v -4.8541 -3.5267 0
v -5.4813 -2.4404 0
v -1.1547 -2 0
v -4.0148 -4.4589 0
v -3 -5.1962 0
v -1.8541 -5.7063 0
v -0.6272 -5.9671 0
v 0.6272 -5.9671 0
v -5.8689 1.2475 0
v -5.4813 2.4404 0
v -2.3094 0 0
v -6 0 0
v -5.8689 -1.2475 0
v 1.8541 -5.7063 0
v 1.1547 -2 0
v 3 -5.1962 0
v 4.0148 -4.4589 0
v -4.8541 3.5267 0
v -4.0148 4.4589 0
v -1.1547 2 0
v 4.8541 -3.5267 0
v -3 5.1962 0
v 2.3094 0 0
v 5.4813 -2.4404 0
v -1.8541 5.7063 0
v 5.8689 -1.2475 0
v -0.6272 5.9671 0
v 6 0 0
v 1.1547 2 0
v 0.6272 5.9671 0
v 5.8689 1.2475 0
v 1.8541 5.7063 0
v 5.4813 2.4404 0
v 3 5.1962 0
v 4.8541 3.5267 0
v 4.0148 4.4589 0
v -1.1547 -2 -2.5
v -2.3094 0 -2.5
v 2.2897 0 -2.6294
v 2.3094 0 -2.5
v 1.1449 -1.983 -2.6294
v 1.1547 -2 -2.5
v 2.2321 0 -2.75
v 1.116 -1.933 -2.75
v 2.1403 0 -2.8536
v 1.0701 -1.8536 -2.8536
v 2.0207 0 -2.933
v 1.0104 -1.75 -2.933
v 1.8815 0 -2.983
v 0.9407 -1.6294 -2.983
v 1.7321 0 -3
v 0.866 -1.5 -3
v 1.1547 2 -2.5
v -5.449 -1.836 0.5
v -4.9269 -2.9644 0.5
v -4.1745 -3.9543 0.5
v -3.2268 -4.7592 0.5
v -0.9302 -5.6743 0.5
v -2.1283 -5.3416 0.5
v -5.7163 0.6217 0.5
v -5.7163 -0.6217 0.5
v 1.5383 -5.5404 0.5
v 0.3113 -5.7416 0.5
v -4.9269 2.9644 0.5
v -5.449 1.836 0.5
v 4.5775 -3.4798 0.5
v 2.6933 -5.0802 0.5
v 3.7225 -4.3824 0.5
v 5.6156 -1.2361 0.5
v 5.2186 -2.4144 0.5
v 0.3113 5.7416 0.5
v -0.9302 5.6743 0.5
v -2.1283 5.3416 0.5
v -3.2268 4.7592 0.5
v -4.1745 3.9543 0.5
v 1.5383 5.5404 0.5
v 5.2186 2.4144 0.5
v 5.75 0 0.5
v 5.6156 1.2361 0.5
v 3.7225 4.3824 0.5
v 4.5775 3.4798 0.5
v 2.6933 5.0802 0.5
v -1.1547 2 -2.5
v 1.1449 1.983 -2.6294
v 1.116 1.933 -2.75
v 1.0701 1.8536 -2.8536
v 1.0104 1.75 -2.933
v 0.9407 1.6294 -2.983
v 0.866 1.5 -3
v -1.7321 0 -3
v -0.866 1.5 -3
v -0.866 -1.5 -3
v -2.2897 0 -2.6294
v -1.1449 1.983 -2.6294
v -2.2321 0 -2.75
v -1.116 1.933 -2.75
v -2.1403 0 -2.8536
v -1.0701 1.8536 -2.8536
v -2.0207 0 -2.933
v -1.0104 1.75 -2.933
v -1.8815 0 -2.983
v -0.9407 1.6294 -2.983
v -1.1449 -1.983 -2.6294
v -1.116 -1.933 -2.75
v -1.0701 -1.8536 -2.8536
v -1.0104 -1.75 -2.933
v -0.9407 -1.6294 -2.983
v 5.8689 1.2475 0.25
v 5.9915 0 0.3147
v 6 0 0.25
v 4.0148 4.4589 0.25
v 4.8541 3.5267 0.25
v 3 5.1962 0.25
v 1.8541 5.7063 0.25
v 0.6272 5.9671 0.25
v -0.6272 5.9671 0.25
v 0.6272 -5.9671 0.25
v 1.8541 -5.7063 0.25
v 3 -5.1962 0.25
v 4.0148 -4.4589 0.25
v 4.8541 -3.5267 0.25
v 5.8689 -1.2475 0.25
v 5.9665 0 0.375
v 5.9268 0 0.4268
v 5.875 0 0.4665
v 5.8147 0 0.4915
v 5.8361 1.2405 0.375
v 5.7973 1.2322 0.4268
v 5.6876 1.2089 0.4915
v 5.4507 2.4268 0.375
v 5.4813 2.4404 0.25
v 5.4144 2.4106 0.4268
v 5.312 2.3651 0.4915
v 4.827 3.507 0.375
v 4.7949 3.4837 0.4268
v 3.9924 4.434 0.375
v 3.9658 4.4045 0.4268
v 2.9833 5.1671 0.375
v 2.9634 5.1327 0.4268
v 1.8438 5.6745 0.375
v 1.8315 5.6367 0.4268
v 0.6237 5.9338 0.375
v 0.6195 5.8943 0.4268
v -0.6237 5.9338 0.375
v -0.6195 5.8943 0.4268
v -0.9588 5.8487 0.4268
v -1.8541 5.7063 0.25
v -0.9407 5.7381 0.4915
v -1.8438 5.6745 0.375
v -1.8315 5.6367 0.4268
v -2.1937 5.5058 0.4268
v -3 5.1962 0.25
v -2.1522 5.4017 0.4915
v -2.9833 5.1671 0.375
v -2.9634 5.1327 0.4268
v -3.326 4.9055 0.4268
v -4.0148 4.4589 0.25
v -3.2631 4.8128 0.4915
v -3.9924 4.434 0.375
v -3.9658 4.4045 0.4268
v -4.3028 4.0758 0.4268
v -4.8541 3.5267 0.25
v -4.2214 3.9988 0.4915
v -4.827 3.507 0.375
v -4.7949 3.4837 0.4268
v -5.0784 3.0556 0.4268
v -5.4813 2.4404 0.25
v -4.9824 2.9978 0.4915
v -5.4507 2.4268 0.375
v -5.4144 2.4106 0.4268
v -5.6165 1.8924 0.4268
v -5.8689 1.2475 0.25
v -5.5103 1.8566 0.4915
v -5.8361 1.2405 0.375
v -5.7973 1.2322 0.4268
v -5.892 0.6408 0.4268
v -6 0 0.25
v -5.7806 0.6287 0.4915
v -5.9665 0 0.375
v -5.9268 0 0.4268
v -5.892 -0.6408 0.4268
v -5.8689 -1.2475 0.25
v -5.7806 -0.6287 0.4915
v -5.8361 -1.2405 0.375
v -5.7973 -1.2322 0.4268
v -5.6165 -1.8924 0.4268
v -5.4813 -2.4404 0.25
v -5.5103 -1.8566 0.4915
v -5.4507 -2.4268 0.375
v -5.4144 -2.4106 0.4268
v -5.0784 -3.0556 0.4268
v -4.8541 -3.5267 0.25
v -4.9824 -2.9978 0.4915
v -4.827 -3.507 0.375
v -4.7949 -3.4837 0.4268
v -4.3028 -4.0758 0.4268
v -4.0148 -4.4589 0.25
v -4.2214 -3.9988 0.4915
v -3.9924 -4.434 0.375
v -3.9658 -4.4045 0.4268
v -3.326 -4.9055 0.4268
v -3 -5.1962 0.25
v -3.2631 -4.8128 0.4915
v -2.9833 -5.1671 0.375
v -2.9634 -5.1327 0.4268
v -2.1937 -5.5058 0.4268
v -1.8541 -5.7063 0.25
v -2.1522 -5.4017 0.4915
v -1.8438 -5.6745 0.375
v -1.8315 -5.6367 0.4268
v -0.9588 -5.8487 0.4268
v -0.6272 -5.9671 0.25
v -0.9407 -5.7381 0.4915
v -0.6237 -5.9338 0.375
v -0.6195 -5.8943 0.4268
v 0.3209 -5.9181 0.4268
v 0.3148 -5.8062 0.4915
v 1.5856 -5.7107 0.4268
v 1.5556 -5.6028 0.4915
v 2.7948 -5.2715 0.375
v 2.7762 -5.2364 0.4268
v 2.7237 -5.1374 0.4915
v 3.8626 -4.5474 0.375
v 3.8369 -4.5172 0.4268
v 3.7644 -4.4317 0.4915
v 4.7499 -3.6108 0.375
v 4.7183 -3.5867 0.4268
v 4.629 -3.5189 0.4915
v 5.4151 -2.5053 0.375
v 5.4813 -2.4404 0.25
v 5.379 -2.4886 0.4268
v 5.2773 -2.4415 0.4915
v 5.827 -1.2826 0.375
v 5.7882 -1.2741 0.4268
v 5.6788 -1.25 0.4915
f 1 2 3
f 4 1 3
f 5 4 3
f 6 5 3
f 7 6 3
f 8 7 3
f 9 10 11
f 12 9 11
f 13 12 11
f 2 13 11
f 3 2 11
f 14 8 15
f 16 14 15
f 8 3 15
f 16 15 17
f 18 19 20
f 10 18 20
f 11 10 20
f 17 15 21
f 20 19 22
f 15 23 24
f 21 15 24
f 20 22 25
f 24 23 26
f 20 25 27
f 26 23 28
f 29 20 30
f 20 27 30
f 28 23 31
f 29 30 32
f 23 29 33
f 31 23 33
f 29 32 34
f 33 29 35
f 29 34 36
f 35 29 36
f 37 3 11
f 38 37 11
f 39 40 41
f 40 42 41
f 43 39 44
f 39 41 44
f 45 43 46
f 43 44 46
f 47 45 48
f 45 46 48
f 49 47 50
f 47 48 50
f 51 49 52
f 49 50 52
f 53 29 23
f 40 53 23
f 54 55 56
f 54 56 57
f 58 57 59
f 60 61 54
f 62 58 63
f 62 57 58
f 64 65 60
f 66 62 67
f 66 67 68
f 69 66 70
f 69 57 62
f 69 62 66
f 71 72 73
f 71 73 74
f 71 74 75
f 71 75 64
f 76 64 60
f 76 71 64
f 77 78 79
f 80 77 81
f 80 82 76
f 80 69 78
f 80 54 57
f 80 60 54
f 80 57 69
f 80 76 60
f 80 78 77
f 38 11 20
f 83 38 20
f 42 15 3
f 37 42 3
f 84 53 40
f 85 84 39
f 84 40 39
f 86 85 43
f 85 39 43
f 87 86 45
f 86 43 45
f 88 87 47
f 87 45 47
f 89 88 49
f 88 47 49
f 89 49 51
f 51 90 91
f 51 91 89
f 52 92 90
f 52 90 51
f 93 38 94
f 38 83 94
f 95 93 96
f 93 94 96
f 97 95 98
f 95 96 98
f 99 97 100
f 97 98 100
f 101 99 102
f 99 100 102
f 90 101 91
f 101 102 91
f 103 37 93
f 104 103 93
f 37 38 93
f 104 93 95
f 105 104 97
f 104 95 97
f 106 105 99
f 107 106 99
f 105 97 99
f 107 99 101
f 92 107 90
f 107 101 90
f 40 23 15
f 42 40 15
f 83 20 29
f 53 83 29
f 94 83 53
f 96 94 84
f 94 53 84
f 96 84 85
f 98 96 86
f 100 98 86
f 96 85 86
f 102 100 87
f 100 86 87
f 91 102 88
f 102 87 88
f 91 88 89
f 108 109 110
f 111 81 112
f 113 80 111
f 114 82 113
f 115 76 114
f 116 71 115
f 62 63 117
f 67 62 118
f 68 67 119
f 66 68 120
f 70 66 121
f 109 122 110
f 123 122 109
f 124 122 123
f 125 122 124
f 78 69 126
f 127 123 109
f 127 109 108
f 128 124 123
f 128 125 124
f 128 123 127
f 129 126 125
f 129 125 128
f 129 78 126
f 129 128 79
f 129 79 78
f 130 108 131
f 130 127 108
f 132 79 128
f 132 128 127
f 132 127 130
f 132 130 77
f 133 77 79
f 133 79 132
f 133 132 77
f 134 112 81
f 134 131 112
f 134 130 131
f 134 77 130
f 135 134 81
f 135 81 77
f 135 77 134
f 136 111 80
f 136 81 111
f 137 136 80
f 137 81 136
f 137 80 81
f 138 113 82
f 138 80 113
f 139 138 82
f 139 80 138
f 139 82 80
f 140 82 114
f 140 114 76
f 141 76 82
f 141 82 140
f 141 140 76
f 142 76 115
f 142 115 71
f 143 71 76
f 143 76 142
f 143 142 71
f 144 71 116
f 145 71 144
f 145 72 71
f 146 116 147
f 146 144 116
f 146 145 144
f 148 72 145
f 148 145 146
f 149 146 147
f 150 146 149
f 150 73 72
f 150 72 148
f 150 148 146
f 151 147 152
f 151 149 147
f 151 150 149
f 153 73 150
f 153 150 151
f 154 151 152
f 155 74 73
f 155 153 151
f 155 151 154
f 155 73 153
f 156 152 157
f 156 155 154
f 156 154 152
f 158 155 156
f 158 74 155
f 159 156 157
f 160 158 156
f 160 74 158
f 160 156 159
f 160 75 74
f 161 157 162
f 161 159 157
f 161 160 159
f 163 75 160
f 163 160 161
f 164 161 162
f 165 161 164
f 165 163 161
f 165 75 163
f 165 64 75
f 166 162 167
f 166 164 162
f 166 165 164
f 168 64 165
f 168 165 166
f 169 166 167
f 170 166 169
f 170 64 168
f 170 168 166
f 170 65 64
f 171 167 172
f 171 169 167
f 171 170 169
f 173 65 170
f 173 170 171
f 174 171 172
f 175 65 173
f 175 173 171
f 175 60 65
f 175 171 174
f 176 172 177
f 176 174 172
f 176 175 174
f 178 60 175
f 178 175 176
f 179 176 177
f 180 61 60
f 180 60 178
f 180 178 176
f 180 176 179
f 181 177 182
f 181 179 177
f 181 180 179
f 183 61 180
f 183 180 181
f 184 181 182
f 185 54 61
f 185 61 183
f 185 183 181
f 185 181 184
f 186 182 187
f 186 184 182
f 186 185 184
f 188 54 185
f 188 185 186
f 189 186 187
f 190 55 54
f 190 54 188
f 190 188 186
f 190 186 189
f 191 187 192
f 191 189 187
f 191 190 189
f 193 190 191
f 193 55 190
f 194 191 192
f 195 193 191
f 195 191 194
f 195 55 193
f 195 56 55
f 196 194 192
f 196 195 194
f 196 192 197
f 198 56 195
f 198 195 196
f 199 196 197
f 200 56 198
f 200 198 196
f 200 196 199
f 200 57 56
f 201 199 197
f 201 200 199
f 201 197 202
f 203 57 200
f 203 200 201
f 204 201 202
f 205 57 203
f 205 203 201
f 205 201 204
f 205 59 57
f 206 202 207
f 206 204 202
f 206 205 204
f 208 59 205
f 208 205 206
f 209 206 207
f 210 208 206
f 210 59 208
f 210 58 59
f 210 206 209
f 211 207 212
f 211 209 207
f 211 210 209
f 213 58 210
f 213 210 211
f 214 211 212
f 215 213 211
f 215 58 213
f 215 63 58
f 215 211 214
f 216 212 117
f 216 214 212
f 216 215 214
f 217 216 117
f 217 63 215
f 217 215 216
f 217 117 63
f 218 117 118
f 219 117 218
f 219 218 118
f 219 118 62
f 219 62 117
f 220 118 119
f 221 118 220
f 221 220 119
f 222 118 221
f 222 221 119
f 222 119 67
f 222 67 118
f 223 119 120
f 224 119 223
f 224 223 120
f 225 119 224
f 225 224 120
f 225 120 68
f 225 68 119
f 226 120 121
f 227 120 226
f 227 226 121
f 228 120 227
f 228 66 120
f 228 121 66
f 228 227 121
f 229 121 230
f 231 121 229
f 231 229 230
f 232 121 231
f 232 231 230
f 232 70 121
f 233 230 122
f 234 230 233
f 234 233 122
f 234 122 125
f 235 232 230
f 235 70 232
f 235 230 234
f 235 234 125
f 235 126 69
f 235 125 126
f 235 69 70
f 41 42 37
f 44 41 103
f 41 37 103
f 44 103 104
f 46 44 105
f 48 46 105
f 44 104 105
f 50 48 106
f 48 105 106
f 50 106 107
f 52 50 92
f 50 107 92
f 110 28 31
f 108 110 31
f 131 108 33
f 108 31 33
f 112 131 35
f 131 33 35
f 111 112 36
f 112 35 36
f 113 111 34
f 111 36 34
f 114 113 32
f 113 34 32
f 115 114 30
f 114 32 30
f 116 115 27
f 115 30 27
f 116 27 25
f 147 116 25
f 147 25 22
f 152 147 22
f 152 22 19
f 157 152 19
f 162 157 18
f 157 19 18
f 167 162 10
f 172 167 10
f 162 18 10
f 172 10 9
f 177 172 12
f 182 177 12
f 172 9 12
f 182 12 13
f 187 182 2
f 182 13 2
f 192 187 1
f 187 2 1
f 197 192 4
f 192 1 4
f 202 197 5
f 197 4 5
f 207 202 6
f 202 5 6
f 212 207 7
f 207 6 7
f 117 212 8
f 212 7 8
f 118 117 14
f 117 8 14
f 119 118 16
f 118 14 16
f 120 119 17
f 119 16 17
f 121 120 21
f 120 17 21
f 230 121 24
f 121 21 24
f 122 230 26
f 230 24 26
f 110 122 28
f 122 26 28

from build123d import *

# Parameters (mm, degrees)
F0_R     = 6
F1_DEPTH = 0.5
F3_DEPTH = 3
F4_R     = 0.5
F5_R     = 0.25


with BuildPart() as f1:
    # F0 (on Top) → F1 (new body)
    with BuildSketch(Plane.XY):
        Circle(F0_R)
    extrude(amount=F1_DEPTH)

    # F2 (on face) → F3 (join)
    with BuildSketch(Plane(origin=(0, 0, 0), x_dir=(1, 0, 0), z_dir=(0, 0, -1))):
        Polygon((-1.154701, -2), (1.154701, -2), (2.309401, 0), (1.154701, 2), (-1.154701, 2), (-2.309401, 0), align=None)
    extrude(amount=F3_DEPTH)

    # F4
    f4_edges = [f1.edges().sort_by_distance(p)[0] for p in [
        (-1.732051, 1, -3),
        (0, 2, -3),
        (1.732051, 1, -3),
        (1.732051, -1, -3),
        (0, -2, -3),
        (-1.732051, -1, -3),
    ]]
    fillet(f4_edges, radius=F4_R)

    # F5
    f5_edges = [f1.edges().sort_by_distance(p)[0] for p in [
        (-6, 0, 0.5),
    ]]
    fillet(f5_edges, radius=F5_R)


solid = f1.part
